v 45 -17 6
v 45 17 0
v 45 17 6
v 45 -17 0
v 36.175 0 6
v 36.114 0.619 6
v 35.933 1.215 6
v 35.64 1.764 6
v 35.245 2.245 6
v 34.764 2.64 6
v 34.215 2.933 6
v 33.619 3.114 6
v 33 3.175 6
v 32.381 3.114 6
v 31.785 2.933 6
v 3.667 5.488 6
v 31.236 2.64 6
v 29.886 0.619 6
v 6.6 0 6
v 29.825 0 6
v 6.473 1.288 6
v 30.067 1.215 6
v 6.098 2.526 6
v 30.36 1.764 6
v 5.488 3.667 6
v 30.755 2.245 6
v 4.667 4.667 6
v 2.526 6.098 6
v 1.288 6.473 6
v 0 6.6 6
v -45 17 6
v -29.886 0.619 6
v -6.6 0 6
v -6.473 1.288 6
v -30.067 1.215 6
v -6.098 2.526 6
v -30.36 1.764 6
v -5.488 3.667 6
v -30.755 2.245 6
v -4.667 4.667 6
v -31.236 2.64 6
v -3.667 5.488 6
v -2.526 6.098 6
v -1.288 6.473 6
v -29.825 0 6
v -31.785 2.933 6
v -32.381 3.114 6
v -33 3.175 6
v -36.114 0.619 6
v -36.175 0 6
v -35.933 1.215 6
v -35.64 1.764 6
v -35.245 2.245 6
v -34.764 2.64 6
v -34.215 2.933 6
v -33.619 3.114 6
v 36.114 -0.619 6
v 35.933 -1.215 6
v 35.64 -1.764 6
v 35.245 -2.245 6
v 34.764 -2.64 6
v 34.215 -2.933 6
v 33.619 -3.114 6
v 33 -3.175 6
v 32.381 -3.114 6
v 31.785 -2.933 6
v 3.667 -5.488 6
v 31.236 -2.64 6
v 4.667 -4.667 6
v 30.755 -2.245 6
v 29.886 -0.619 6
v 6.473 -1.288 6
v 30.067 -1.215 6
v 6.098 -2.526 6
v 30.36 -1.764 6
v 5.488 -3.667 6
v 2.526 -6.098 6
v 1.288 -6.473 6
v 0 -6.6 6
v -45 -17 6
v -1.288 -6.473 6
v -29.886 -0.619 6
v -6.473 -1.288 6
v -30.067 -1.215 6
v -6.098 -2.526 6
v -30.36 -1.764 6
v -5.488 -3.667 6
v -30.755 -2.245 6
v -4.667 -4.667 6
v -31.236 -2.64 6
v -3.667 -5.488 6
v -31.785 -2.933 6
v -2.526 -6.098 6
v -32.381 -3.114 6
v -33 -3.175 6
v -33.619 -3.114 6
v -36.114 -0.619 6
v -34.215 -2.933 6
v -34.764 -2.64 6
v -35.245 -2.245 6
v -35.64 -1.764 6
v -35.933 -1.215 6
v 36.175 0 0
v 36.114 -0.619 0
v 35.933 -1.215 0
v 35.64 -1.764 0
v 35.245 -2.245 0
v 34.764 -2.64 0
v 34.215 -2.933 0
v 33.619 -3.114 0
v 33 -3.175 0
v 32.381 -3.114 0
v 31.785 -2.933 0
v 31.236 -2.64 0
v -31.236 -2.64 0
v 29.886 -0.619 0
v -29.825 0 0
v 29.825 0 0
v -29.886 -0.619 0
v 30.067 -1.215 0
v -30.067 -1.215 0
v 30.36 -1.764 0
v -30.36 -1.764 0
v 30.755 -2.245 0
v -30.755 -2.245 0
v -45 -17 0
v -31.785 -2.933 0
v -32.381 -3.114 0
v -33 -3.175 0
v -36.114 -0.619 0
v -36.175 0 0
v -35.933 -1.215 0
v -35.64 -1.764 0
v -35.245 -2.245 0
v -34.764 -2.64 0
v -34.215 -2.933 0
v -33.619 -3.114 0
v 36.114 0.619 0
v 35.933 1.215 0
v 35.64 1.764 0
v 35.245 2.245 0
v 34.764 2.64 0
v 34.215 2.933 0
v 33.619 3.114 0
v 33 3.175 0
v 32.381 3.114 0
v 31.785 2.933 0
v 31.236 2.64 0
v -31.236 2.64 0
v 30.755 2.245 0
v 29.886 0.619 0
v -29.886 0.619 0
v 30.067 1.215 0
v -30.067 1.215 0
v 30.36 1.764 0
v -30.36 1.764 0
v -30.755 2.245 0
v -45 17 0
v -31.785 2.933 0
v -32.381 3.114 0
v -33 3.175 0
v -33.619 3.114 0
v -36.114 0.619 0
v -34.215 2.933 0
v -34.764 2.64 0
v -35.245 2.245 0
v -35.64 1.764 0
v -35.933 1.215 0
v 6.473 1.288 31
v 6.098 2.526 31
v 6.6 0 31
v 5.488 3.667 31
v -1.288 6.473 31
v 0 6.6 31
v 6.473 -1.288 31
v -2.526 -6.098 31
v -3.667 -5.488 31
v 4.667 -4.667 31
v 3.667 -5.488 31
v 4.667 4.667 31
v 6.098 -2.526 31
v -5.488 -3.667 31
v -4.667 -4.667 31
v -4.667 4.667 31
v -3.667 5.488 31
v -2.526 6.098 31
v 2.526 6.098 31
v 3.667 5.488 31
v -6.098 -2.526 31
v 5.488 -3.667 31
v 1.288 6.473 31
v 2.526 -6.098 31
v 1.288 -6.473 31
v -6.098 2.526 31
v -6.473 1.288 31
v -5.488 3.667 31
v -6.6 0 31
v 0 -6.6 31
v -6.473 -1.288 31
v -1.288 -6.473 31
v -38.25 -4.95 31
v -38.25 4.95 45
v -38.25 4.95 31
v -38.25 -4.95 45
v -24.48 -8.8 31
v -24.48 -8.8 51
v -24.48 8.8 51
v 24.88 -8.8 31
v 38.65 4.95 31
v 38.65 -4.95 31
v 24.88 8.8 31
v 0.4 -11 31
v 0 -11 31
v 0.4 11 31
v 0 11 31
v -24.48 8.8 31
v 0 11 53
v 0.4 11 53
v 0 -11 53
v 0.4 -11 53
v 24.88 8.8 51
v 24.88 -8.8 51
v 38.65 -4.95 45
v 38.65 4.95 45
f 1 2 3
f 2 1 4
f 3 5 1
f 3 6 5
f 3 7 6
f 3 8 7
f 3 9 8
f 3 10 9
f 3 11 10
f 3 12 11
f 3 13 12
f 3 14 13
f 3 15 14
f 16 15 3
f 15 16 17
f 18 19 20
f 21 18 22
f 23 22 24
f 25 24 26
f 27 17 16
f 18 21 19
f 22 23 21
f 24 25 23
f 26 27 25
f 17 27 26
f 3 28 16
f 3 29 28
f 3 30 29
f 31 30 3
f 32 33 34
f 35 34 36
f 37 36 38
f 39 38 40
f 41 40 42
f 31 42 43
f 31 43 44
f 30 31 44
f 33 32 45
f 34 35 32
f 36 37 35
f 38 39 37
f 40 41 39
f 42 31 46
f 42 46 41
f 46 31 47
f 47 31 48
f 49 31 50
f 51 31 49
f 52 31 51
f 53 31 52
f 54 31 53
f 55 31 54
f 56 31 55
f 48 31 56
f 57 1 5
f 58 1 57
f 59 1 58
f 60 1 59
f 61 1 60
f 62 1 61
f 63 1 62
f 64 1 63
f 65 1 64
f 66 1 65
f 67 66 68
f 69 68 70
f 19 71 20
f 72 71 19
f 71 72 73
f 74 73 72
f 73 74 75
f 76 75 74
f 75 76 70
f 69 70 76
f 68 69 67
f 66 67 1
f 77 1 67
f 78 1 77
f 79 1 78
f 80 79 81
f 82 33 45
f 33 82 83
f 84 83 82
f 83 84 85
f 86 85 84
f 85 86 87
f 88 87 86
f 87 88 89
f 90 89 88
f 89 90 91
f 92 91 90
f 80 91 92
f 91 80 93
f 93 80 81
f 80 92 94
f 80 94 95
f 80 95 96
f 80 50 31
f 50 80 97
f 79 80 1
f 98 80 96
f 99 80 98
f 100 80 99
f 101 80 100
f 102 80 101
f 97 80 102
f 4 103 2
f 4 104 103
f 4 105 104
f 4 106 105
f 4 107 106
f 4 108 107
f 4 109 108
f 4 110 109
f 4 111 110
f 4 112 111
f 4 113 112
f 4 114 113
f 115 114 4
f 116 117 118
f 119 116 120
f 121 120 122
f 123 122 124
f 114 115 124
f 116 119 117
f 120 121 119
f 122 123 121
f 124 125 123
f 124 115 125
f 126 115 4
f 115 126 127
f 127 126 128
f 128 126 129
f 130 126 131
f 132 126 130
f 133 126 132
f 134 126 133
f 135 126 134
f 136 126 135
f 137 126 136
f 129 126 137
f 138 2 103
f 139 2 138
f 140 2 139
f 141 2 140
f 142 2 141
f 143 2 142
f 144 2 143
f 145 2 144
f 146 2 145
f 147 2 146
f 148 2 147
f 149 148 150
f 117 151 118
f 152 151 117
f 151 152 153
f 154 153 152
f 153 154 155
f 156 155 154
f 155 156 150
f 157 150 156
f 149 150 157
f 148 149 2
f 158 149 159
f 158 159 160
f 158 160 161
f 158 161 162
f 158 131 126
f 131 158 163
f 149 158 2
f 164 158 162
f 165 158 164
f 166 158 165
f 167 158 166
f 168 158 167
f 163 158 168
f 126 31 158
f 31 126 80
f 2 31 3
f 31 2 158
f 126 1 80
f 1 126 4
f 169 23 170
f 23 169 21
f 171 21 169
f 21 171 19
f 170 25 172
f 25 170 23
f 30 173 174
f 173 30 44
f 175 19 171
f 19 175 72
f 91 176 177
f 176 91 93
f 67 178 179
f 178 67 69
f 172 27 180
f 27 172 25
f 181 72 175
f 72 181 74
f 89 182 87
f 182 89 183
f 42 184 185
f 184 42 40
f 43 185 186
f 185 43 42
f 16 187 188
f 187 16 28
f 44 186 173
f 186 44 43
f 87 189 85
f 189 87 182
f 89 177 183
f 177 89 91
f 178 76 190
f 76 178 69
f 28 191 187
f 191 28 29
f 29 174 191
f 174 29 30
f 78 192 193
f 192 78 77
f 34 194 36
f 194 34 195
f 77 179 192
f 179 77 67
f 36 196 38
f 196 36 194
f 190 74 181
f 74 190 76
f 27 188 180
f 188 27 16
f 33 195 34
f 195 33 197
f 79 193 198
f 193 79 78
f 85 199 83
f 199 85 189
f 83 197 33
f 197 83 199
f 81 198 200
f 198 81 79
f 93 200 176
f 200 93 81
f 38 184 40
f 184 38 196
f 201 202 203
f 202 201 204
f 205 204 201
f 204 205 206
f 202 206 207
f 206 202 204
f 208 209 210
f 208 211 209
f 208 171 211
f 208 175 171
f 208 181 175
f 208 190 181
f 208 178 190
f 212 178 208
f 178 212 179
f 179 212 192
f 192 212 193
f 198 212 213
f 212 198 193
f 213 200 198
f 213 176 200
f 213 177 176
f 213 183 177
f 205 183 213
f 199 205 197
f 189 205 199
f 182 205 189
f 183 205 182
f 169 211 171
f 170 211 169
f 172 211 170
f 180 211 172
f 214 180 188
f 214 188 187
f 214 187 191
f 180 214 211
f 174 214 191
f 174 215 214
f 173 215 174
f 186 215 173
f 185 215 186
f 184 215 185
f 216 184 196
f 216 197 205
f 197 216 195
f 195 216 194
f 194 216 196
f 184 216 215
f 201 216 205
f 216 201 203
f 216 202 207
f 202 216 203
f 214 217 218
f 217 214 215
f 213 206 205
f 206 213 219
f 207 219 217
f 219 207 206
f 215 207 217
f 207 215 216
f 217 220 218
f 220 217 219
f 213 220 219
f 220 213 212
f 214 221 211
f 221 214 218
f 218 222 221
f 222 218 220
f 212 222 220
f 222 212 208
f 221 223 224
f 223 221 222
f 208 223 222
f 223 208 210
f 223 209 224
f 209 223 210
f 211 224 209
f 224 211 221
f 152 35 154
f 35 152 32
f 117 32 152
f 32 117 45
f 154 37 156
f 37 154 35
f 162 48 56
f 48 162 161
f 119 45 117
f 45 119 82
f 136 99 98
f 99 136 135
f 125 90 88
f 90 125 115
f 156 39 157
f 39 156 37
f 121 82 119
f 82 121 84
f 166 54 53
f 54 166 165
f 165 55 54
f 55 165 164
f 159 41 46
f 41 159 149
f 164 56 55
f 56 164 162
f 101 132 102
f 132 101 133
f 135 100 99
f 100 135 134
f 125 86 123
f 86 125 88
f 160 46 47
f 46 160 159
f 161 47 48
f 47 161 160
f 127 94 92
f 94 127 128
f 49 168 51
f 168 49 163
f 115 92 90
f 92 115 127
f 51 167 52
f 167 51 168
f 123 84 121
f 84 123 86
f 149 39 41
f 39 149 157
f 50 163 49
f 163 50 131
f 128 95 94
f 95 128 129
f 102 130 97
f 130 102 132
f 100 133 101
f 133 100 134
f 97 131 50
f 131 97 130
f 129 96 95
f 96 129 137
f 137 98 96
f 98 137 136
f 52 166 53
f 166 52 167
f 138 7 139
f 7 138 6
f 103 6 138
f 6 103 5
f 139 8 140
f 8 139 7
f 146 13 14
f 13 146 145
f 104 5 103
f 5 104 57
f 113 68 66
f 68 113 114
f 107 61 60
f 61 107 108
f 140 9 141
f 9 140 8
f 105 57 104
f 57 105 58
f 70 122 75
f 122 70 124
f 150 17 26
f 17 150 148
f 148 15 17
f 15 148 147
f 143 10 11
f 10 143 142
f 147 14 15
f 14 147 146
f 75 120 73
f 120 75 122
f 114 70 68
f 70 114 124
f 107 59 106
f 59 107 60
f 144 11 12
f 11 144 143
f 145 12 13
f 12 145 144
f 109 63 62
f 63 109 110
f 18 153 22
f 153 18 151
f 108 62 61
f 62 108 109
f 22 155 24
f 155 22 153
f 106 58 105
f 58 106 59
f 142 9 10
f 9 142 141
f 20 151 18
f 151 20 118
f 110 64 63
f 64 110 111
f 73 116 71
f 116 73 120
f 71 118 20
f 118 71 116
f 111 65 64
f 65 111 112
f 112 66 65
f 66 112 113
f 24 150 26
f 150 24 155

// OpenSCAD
$fn = 32;

// ----------------------------------------------------------------------
// Boat cleat: 90 mm base, horn 42 mm up
// ----------------------------------------------------------------------

// --- parameters (mm) ---
base_l = 90;              // base length
base_w = 34;              // base width
base_t = 6;               // base thickness
horn_len = 76.5;          // horn length
horn_d = 22;              // horn diameter at the middle
horn_z = 42;              // horn axis height
end_drop = 8;             // how far the horn tips drop
post_d = 13.2;            // centre post diameter
holes_d = 6.35;           // fixing holes
hole_x = 33;              // fixing hole spacing

difference() {
  union() {
    translate([-45, -17, 0]) cube([base_l, base_w, base_t]);
    /* centre post, sunk 1 mm into the base */
    translate([0, 0, 5]) cylinder(h = 37, d = post_d);
    /* horn: a hull chain of boxes, full in the middle and lighter at the tips */
    hull() {
      translate([-38.25, -4.95, 31]) cube([0.4, 9.9, 14], center = false);
      translate([-24.48, -8.8, 31]) cube([0.4, 17.6, 20], center = false);
    }
    hull() {
      translate([-24.48, -8.8, 31]) cube([0.4, 17.6, 20], center = false);
      translate([0, -11, 31]) cube([0.4, 22, 22], center = false);
    }
    hull() {
      translate([0, -11, 31]) cube([0.4, 22, 22], center = false);
      translate([24.48, -8.8, 31]) cube([0.4, 17.6, 20], center = false);
    }
    hull() {
      translate([24.48, -8.8, 31]) cube([0.4, 17.6, 20], center = false);
      translate([38.25, -4.95, 31]) cube([0.4, 9.9, 14], center = false);
    }
  }
  translate([-33, 0, -2.5]) cylinder(h = base_t + 5, d = holes_d);
  translate([33, 0, -2.5]) cylinder(h = base_t + 5, d = holes_d);
}
